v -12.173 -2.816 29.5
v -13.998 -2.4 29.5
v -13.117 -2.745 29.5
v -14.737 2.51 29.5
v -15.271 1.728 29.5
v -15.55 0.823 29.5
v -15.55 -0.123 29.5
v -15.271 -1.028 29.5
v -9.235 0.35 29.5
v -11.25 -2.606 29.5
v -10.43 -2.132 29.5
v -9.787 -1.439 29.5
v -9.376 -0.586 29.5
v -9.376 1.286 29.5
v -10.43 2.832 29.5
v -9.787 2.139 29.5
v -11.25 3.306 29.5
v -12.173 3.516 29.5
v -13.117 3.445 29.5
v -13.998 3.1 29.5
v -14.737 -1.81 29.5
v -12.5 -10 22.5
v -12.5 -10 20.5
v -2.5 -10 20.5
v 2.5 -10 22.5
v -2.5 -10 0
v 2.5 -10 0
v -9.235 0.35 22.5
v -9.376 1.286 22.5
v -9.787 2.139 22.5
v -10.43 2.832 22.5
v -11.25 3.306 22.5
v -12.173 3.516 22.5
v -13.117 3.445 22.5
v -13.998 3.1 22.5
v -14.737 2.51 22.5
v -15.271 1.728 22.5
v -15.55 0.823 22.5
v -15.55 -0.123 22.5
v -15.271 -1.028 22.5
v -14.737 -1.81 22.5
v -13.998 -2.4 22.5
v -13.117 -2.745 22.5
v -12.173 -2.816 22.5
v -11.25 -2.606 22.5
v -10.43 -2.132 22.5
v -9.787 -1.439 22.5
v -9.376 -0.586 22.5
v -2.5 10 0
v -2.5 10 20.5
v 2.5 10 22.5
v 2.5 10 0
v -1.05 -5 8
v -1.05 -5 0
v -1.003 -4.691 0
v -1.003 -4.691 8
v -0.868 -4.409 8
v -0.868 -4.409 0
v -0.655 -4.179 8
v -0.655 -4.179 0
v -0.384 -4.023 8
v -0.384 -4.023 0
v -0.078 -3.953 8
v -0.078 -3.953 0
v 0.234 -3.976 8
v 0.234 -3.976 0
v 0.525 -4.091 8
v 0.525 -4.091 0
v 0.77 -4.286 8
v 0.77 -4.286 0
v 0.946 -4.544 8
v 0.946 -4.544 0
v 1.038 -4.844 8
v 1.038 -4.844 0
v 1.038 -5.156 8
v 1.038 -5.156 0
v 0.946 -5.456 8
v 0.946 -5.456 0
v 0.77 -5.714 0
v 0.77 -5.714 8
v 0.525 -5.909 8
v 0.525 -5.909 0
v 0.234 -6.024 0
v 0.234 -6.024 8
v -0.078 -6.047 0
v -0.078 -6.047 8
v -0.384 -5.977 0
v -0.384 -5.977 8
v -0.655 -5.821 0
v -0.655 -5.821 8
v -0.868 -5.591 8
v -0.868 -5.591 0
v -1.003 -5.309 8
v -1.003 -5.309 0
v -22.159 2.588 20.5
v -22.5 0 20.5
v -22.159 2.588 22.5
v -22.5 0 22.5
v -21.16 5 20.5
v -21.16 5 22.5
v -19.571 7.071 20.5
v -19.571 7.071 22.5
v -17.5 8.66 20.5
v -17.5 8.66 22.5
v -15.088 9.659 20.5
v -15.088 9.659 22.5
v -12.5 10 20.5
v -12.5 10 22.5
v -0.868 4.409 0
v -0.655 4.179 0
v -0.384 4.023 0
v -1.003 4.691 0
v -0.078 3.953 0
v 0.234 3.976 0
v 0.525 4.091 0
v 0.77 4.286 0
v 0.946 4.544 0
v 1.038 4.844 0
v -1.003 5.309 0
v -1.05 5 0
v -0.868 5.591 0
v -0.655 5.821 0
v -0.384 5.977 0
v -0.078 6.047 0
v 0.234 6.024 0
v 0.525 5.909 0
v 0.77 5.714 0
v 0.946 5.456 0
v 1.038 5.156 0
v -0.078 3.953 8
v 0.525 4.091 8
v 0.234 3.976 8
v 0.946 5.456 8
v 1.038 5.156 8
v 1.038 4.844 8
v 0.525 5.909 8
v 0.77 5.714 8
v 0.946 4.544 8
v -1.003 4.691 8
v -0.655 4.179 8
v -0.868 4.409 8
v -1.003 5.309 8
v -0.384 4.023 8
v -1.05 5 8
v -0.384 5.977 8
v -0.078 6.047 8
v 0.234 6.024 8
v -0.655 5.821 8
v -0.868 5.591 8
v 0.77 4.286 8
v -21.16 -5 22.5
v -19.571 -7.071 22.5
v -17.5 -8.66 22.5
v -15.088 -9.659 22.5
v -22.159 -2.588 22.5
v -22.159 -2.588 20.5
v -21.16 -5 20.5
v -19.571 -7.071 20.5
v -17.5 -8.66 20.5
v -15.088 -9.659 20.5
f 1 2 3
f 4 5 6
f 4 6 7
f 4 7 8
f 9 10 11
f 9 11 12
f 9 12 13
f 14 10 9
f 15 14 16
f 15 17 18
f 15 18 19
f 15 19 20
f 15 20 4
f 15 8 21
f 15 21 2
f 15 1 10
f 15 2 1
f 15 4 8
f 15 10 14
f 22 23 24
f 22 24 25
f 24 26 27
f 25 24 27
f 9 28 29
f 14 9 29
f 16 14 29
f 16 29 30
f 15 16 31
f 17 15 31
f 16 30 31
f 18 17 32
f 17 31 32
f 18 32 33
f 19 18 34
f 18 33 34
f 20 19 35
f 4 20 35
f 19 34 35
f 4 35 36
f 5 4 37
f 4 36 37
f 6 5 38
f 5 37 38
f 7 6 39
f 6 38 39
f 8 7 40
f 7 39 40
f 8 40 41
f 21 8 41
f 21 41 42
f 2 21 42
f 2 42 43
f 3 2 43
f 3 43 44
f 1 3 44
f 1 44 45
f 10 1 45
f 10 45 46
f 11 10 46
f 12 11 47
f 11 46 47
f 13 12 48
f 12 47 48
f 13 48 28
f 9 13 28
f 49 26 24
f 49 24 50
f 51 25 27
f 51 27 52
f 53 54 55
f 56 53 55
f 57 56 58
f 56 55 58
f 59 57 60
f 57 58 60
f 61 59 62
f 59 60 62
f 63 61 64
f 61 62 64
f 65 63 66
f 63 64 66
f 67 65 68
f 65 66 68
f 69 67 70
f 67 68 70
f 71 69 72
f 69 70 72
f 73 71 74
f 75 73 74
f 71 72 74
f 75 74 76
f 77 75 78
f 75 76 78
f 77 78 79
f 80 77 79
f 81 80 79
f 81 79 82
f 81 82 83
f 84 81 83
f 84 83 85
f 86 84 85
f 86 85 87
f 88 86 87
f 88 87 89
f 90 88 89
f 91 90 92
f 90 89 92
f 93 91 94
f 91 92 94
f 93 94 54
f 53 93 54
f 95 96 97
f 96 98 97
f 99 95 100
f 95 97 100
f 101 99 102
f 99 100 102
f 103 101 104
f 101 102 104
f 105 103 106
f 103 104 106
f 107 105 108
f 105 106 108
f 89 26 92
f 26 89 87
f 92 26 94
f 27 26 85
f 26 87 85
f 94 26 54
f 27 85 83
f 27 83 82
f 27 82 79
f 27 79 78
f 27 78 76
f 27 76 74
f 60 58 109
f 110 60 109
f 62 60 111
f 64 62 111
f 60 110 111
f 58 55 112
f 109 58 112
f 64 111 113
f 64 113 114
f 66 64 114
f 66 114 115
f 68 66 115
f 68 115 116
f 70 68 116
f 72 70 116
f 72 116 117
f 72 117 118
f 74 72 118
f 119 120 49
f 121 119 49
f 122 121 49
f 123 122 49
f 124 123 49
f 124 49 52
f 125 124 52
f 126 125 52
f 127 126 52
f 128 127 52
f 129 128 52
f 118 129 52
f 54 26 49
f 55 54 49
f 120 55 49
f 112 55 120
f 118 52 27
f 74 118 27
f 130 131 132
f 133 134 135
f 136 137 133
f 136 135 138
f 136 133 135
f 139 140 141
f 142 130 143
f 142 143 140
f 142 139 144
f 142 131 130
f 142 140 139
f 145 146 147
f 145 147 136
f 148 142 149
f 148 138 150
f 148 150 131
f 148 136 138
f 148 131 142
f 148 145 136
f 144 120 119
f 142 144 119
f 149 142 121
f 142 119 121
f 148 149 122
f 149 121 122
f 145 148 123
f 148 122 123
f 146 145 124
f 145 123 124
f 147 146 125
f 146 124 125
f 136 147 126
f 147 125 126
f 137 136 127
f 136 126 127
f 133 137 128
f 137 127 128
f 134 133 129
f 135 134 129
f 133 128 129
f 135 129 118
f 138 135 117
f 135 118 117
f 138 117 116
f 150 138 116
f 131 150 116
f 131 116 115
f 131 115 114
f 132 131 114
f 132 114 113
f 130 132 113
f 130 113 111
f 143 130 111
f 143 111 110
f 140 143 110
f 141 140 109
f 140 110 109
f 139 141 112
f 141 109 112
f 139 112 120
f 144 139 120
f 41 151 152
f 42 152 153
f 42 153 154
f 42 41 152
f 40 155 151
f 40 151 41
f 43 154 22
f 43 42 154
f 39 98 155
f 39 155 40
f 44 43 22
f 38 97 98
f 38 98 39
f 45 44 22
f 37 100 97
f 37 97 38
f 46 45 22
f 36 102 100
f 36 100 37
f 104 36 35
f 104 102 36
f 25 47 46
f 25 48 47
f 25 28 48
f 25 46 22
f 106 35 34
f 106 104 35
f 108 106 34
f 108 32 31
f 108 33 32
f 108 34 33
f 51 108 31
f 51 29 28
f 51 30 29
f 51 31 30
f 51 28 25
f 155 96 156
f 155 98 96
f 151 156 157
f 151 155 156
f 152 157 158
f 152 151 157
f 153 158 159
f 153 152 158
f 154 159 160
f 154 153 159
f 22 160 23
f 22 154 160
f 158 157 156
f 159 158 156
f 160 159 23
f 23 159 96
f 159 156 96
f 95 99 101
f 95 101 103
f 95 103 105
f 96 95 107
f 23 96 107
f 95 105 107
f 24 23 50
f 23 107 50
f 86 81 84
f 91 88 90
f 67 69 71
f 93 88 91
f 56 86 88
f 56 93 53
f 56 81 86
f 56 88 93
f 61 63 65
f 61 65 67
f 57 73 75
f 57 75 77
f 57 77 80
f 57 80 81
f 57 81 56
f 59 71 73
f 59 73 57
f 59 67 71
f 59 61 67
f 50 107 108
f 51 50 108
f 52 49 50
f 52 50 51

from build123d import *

# Parameters (mm, degrees)
ESQUISSE1_W             = 5
ESQUISSE1_H             = 20
BOSS_EXTRU_1_DEPTH      = 20.5
ESQUISSE2_W             = 25
ESQUISSE2_H             = 20
BOSS_EXTRU_2_DEPTH      = 2
ESQUISSE3_R             = 3.175
BOSS_EXTRU_3_DEPTH      = 7
CONG_1_R                = 10
ESQUISSE4_R             = 1.05
ENL_V_MAT_EXTRU_1_DEPTH = 8


with BuildPart() as part:
    # Esquisse1 → Boss.-Extru.1 (new body)
    with BuildSketch(Plane.XY):
        Rectangle(ESQUISSE1_W, ESQUISSE1_H)
    extrude(amount=BOSS_EXTRU_1_DEPTH)

    # Esquisse2 → Boss.-Extru.2 (add)
    with BuildSketch(Plane.XY.offset(20.5)):
        with Locations((-10, 0)):
            Rectangle(ESQUISSE2_W, ESQUISSE2_H)
    extrude(amount=BOSS_EXTRU_2_DEPTH)

    # Esquisse3 → Boss.-Extru.3 (add)
    with BuildSketch(Plane.XY.offset(22.5)):
        with Locations((-12.41, 0.35)):
            Circle(ESQUISSE3_R)
    extrude(amount=BOSS_EXTRU_3_DEPTH)

    # Congé1
    cong_1_edges = [part.edges().sort_by_distance(p)[0] for p in [
        (-22.5, 10, 21.5),
        (-22.5, -10, 21.5),
    ]]
    fillet(cong_1_edges, radius=CONG_1_R - 0.0001)  # a hair under: the kernel refuses the full size

    # Esquisse4 → Enlèv. mat.-Extru.1 (cut)
    with BuildSketch(Plane(origin=(0, 0, 0), x_dir=(-1, 0, 0), z_dir=(0, 0, -1))):
        with Locations((0, 5)):
            Circle(ESQUISSE4_R)
        with Locations((0, -5)):
            Circle(ESQUISSE4_R)
    extrude(amount=-ENL_V_MAT_EXTRU_1_DEPTH, mode=Mode.SUBTRACT)


solid = part.part
